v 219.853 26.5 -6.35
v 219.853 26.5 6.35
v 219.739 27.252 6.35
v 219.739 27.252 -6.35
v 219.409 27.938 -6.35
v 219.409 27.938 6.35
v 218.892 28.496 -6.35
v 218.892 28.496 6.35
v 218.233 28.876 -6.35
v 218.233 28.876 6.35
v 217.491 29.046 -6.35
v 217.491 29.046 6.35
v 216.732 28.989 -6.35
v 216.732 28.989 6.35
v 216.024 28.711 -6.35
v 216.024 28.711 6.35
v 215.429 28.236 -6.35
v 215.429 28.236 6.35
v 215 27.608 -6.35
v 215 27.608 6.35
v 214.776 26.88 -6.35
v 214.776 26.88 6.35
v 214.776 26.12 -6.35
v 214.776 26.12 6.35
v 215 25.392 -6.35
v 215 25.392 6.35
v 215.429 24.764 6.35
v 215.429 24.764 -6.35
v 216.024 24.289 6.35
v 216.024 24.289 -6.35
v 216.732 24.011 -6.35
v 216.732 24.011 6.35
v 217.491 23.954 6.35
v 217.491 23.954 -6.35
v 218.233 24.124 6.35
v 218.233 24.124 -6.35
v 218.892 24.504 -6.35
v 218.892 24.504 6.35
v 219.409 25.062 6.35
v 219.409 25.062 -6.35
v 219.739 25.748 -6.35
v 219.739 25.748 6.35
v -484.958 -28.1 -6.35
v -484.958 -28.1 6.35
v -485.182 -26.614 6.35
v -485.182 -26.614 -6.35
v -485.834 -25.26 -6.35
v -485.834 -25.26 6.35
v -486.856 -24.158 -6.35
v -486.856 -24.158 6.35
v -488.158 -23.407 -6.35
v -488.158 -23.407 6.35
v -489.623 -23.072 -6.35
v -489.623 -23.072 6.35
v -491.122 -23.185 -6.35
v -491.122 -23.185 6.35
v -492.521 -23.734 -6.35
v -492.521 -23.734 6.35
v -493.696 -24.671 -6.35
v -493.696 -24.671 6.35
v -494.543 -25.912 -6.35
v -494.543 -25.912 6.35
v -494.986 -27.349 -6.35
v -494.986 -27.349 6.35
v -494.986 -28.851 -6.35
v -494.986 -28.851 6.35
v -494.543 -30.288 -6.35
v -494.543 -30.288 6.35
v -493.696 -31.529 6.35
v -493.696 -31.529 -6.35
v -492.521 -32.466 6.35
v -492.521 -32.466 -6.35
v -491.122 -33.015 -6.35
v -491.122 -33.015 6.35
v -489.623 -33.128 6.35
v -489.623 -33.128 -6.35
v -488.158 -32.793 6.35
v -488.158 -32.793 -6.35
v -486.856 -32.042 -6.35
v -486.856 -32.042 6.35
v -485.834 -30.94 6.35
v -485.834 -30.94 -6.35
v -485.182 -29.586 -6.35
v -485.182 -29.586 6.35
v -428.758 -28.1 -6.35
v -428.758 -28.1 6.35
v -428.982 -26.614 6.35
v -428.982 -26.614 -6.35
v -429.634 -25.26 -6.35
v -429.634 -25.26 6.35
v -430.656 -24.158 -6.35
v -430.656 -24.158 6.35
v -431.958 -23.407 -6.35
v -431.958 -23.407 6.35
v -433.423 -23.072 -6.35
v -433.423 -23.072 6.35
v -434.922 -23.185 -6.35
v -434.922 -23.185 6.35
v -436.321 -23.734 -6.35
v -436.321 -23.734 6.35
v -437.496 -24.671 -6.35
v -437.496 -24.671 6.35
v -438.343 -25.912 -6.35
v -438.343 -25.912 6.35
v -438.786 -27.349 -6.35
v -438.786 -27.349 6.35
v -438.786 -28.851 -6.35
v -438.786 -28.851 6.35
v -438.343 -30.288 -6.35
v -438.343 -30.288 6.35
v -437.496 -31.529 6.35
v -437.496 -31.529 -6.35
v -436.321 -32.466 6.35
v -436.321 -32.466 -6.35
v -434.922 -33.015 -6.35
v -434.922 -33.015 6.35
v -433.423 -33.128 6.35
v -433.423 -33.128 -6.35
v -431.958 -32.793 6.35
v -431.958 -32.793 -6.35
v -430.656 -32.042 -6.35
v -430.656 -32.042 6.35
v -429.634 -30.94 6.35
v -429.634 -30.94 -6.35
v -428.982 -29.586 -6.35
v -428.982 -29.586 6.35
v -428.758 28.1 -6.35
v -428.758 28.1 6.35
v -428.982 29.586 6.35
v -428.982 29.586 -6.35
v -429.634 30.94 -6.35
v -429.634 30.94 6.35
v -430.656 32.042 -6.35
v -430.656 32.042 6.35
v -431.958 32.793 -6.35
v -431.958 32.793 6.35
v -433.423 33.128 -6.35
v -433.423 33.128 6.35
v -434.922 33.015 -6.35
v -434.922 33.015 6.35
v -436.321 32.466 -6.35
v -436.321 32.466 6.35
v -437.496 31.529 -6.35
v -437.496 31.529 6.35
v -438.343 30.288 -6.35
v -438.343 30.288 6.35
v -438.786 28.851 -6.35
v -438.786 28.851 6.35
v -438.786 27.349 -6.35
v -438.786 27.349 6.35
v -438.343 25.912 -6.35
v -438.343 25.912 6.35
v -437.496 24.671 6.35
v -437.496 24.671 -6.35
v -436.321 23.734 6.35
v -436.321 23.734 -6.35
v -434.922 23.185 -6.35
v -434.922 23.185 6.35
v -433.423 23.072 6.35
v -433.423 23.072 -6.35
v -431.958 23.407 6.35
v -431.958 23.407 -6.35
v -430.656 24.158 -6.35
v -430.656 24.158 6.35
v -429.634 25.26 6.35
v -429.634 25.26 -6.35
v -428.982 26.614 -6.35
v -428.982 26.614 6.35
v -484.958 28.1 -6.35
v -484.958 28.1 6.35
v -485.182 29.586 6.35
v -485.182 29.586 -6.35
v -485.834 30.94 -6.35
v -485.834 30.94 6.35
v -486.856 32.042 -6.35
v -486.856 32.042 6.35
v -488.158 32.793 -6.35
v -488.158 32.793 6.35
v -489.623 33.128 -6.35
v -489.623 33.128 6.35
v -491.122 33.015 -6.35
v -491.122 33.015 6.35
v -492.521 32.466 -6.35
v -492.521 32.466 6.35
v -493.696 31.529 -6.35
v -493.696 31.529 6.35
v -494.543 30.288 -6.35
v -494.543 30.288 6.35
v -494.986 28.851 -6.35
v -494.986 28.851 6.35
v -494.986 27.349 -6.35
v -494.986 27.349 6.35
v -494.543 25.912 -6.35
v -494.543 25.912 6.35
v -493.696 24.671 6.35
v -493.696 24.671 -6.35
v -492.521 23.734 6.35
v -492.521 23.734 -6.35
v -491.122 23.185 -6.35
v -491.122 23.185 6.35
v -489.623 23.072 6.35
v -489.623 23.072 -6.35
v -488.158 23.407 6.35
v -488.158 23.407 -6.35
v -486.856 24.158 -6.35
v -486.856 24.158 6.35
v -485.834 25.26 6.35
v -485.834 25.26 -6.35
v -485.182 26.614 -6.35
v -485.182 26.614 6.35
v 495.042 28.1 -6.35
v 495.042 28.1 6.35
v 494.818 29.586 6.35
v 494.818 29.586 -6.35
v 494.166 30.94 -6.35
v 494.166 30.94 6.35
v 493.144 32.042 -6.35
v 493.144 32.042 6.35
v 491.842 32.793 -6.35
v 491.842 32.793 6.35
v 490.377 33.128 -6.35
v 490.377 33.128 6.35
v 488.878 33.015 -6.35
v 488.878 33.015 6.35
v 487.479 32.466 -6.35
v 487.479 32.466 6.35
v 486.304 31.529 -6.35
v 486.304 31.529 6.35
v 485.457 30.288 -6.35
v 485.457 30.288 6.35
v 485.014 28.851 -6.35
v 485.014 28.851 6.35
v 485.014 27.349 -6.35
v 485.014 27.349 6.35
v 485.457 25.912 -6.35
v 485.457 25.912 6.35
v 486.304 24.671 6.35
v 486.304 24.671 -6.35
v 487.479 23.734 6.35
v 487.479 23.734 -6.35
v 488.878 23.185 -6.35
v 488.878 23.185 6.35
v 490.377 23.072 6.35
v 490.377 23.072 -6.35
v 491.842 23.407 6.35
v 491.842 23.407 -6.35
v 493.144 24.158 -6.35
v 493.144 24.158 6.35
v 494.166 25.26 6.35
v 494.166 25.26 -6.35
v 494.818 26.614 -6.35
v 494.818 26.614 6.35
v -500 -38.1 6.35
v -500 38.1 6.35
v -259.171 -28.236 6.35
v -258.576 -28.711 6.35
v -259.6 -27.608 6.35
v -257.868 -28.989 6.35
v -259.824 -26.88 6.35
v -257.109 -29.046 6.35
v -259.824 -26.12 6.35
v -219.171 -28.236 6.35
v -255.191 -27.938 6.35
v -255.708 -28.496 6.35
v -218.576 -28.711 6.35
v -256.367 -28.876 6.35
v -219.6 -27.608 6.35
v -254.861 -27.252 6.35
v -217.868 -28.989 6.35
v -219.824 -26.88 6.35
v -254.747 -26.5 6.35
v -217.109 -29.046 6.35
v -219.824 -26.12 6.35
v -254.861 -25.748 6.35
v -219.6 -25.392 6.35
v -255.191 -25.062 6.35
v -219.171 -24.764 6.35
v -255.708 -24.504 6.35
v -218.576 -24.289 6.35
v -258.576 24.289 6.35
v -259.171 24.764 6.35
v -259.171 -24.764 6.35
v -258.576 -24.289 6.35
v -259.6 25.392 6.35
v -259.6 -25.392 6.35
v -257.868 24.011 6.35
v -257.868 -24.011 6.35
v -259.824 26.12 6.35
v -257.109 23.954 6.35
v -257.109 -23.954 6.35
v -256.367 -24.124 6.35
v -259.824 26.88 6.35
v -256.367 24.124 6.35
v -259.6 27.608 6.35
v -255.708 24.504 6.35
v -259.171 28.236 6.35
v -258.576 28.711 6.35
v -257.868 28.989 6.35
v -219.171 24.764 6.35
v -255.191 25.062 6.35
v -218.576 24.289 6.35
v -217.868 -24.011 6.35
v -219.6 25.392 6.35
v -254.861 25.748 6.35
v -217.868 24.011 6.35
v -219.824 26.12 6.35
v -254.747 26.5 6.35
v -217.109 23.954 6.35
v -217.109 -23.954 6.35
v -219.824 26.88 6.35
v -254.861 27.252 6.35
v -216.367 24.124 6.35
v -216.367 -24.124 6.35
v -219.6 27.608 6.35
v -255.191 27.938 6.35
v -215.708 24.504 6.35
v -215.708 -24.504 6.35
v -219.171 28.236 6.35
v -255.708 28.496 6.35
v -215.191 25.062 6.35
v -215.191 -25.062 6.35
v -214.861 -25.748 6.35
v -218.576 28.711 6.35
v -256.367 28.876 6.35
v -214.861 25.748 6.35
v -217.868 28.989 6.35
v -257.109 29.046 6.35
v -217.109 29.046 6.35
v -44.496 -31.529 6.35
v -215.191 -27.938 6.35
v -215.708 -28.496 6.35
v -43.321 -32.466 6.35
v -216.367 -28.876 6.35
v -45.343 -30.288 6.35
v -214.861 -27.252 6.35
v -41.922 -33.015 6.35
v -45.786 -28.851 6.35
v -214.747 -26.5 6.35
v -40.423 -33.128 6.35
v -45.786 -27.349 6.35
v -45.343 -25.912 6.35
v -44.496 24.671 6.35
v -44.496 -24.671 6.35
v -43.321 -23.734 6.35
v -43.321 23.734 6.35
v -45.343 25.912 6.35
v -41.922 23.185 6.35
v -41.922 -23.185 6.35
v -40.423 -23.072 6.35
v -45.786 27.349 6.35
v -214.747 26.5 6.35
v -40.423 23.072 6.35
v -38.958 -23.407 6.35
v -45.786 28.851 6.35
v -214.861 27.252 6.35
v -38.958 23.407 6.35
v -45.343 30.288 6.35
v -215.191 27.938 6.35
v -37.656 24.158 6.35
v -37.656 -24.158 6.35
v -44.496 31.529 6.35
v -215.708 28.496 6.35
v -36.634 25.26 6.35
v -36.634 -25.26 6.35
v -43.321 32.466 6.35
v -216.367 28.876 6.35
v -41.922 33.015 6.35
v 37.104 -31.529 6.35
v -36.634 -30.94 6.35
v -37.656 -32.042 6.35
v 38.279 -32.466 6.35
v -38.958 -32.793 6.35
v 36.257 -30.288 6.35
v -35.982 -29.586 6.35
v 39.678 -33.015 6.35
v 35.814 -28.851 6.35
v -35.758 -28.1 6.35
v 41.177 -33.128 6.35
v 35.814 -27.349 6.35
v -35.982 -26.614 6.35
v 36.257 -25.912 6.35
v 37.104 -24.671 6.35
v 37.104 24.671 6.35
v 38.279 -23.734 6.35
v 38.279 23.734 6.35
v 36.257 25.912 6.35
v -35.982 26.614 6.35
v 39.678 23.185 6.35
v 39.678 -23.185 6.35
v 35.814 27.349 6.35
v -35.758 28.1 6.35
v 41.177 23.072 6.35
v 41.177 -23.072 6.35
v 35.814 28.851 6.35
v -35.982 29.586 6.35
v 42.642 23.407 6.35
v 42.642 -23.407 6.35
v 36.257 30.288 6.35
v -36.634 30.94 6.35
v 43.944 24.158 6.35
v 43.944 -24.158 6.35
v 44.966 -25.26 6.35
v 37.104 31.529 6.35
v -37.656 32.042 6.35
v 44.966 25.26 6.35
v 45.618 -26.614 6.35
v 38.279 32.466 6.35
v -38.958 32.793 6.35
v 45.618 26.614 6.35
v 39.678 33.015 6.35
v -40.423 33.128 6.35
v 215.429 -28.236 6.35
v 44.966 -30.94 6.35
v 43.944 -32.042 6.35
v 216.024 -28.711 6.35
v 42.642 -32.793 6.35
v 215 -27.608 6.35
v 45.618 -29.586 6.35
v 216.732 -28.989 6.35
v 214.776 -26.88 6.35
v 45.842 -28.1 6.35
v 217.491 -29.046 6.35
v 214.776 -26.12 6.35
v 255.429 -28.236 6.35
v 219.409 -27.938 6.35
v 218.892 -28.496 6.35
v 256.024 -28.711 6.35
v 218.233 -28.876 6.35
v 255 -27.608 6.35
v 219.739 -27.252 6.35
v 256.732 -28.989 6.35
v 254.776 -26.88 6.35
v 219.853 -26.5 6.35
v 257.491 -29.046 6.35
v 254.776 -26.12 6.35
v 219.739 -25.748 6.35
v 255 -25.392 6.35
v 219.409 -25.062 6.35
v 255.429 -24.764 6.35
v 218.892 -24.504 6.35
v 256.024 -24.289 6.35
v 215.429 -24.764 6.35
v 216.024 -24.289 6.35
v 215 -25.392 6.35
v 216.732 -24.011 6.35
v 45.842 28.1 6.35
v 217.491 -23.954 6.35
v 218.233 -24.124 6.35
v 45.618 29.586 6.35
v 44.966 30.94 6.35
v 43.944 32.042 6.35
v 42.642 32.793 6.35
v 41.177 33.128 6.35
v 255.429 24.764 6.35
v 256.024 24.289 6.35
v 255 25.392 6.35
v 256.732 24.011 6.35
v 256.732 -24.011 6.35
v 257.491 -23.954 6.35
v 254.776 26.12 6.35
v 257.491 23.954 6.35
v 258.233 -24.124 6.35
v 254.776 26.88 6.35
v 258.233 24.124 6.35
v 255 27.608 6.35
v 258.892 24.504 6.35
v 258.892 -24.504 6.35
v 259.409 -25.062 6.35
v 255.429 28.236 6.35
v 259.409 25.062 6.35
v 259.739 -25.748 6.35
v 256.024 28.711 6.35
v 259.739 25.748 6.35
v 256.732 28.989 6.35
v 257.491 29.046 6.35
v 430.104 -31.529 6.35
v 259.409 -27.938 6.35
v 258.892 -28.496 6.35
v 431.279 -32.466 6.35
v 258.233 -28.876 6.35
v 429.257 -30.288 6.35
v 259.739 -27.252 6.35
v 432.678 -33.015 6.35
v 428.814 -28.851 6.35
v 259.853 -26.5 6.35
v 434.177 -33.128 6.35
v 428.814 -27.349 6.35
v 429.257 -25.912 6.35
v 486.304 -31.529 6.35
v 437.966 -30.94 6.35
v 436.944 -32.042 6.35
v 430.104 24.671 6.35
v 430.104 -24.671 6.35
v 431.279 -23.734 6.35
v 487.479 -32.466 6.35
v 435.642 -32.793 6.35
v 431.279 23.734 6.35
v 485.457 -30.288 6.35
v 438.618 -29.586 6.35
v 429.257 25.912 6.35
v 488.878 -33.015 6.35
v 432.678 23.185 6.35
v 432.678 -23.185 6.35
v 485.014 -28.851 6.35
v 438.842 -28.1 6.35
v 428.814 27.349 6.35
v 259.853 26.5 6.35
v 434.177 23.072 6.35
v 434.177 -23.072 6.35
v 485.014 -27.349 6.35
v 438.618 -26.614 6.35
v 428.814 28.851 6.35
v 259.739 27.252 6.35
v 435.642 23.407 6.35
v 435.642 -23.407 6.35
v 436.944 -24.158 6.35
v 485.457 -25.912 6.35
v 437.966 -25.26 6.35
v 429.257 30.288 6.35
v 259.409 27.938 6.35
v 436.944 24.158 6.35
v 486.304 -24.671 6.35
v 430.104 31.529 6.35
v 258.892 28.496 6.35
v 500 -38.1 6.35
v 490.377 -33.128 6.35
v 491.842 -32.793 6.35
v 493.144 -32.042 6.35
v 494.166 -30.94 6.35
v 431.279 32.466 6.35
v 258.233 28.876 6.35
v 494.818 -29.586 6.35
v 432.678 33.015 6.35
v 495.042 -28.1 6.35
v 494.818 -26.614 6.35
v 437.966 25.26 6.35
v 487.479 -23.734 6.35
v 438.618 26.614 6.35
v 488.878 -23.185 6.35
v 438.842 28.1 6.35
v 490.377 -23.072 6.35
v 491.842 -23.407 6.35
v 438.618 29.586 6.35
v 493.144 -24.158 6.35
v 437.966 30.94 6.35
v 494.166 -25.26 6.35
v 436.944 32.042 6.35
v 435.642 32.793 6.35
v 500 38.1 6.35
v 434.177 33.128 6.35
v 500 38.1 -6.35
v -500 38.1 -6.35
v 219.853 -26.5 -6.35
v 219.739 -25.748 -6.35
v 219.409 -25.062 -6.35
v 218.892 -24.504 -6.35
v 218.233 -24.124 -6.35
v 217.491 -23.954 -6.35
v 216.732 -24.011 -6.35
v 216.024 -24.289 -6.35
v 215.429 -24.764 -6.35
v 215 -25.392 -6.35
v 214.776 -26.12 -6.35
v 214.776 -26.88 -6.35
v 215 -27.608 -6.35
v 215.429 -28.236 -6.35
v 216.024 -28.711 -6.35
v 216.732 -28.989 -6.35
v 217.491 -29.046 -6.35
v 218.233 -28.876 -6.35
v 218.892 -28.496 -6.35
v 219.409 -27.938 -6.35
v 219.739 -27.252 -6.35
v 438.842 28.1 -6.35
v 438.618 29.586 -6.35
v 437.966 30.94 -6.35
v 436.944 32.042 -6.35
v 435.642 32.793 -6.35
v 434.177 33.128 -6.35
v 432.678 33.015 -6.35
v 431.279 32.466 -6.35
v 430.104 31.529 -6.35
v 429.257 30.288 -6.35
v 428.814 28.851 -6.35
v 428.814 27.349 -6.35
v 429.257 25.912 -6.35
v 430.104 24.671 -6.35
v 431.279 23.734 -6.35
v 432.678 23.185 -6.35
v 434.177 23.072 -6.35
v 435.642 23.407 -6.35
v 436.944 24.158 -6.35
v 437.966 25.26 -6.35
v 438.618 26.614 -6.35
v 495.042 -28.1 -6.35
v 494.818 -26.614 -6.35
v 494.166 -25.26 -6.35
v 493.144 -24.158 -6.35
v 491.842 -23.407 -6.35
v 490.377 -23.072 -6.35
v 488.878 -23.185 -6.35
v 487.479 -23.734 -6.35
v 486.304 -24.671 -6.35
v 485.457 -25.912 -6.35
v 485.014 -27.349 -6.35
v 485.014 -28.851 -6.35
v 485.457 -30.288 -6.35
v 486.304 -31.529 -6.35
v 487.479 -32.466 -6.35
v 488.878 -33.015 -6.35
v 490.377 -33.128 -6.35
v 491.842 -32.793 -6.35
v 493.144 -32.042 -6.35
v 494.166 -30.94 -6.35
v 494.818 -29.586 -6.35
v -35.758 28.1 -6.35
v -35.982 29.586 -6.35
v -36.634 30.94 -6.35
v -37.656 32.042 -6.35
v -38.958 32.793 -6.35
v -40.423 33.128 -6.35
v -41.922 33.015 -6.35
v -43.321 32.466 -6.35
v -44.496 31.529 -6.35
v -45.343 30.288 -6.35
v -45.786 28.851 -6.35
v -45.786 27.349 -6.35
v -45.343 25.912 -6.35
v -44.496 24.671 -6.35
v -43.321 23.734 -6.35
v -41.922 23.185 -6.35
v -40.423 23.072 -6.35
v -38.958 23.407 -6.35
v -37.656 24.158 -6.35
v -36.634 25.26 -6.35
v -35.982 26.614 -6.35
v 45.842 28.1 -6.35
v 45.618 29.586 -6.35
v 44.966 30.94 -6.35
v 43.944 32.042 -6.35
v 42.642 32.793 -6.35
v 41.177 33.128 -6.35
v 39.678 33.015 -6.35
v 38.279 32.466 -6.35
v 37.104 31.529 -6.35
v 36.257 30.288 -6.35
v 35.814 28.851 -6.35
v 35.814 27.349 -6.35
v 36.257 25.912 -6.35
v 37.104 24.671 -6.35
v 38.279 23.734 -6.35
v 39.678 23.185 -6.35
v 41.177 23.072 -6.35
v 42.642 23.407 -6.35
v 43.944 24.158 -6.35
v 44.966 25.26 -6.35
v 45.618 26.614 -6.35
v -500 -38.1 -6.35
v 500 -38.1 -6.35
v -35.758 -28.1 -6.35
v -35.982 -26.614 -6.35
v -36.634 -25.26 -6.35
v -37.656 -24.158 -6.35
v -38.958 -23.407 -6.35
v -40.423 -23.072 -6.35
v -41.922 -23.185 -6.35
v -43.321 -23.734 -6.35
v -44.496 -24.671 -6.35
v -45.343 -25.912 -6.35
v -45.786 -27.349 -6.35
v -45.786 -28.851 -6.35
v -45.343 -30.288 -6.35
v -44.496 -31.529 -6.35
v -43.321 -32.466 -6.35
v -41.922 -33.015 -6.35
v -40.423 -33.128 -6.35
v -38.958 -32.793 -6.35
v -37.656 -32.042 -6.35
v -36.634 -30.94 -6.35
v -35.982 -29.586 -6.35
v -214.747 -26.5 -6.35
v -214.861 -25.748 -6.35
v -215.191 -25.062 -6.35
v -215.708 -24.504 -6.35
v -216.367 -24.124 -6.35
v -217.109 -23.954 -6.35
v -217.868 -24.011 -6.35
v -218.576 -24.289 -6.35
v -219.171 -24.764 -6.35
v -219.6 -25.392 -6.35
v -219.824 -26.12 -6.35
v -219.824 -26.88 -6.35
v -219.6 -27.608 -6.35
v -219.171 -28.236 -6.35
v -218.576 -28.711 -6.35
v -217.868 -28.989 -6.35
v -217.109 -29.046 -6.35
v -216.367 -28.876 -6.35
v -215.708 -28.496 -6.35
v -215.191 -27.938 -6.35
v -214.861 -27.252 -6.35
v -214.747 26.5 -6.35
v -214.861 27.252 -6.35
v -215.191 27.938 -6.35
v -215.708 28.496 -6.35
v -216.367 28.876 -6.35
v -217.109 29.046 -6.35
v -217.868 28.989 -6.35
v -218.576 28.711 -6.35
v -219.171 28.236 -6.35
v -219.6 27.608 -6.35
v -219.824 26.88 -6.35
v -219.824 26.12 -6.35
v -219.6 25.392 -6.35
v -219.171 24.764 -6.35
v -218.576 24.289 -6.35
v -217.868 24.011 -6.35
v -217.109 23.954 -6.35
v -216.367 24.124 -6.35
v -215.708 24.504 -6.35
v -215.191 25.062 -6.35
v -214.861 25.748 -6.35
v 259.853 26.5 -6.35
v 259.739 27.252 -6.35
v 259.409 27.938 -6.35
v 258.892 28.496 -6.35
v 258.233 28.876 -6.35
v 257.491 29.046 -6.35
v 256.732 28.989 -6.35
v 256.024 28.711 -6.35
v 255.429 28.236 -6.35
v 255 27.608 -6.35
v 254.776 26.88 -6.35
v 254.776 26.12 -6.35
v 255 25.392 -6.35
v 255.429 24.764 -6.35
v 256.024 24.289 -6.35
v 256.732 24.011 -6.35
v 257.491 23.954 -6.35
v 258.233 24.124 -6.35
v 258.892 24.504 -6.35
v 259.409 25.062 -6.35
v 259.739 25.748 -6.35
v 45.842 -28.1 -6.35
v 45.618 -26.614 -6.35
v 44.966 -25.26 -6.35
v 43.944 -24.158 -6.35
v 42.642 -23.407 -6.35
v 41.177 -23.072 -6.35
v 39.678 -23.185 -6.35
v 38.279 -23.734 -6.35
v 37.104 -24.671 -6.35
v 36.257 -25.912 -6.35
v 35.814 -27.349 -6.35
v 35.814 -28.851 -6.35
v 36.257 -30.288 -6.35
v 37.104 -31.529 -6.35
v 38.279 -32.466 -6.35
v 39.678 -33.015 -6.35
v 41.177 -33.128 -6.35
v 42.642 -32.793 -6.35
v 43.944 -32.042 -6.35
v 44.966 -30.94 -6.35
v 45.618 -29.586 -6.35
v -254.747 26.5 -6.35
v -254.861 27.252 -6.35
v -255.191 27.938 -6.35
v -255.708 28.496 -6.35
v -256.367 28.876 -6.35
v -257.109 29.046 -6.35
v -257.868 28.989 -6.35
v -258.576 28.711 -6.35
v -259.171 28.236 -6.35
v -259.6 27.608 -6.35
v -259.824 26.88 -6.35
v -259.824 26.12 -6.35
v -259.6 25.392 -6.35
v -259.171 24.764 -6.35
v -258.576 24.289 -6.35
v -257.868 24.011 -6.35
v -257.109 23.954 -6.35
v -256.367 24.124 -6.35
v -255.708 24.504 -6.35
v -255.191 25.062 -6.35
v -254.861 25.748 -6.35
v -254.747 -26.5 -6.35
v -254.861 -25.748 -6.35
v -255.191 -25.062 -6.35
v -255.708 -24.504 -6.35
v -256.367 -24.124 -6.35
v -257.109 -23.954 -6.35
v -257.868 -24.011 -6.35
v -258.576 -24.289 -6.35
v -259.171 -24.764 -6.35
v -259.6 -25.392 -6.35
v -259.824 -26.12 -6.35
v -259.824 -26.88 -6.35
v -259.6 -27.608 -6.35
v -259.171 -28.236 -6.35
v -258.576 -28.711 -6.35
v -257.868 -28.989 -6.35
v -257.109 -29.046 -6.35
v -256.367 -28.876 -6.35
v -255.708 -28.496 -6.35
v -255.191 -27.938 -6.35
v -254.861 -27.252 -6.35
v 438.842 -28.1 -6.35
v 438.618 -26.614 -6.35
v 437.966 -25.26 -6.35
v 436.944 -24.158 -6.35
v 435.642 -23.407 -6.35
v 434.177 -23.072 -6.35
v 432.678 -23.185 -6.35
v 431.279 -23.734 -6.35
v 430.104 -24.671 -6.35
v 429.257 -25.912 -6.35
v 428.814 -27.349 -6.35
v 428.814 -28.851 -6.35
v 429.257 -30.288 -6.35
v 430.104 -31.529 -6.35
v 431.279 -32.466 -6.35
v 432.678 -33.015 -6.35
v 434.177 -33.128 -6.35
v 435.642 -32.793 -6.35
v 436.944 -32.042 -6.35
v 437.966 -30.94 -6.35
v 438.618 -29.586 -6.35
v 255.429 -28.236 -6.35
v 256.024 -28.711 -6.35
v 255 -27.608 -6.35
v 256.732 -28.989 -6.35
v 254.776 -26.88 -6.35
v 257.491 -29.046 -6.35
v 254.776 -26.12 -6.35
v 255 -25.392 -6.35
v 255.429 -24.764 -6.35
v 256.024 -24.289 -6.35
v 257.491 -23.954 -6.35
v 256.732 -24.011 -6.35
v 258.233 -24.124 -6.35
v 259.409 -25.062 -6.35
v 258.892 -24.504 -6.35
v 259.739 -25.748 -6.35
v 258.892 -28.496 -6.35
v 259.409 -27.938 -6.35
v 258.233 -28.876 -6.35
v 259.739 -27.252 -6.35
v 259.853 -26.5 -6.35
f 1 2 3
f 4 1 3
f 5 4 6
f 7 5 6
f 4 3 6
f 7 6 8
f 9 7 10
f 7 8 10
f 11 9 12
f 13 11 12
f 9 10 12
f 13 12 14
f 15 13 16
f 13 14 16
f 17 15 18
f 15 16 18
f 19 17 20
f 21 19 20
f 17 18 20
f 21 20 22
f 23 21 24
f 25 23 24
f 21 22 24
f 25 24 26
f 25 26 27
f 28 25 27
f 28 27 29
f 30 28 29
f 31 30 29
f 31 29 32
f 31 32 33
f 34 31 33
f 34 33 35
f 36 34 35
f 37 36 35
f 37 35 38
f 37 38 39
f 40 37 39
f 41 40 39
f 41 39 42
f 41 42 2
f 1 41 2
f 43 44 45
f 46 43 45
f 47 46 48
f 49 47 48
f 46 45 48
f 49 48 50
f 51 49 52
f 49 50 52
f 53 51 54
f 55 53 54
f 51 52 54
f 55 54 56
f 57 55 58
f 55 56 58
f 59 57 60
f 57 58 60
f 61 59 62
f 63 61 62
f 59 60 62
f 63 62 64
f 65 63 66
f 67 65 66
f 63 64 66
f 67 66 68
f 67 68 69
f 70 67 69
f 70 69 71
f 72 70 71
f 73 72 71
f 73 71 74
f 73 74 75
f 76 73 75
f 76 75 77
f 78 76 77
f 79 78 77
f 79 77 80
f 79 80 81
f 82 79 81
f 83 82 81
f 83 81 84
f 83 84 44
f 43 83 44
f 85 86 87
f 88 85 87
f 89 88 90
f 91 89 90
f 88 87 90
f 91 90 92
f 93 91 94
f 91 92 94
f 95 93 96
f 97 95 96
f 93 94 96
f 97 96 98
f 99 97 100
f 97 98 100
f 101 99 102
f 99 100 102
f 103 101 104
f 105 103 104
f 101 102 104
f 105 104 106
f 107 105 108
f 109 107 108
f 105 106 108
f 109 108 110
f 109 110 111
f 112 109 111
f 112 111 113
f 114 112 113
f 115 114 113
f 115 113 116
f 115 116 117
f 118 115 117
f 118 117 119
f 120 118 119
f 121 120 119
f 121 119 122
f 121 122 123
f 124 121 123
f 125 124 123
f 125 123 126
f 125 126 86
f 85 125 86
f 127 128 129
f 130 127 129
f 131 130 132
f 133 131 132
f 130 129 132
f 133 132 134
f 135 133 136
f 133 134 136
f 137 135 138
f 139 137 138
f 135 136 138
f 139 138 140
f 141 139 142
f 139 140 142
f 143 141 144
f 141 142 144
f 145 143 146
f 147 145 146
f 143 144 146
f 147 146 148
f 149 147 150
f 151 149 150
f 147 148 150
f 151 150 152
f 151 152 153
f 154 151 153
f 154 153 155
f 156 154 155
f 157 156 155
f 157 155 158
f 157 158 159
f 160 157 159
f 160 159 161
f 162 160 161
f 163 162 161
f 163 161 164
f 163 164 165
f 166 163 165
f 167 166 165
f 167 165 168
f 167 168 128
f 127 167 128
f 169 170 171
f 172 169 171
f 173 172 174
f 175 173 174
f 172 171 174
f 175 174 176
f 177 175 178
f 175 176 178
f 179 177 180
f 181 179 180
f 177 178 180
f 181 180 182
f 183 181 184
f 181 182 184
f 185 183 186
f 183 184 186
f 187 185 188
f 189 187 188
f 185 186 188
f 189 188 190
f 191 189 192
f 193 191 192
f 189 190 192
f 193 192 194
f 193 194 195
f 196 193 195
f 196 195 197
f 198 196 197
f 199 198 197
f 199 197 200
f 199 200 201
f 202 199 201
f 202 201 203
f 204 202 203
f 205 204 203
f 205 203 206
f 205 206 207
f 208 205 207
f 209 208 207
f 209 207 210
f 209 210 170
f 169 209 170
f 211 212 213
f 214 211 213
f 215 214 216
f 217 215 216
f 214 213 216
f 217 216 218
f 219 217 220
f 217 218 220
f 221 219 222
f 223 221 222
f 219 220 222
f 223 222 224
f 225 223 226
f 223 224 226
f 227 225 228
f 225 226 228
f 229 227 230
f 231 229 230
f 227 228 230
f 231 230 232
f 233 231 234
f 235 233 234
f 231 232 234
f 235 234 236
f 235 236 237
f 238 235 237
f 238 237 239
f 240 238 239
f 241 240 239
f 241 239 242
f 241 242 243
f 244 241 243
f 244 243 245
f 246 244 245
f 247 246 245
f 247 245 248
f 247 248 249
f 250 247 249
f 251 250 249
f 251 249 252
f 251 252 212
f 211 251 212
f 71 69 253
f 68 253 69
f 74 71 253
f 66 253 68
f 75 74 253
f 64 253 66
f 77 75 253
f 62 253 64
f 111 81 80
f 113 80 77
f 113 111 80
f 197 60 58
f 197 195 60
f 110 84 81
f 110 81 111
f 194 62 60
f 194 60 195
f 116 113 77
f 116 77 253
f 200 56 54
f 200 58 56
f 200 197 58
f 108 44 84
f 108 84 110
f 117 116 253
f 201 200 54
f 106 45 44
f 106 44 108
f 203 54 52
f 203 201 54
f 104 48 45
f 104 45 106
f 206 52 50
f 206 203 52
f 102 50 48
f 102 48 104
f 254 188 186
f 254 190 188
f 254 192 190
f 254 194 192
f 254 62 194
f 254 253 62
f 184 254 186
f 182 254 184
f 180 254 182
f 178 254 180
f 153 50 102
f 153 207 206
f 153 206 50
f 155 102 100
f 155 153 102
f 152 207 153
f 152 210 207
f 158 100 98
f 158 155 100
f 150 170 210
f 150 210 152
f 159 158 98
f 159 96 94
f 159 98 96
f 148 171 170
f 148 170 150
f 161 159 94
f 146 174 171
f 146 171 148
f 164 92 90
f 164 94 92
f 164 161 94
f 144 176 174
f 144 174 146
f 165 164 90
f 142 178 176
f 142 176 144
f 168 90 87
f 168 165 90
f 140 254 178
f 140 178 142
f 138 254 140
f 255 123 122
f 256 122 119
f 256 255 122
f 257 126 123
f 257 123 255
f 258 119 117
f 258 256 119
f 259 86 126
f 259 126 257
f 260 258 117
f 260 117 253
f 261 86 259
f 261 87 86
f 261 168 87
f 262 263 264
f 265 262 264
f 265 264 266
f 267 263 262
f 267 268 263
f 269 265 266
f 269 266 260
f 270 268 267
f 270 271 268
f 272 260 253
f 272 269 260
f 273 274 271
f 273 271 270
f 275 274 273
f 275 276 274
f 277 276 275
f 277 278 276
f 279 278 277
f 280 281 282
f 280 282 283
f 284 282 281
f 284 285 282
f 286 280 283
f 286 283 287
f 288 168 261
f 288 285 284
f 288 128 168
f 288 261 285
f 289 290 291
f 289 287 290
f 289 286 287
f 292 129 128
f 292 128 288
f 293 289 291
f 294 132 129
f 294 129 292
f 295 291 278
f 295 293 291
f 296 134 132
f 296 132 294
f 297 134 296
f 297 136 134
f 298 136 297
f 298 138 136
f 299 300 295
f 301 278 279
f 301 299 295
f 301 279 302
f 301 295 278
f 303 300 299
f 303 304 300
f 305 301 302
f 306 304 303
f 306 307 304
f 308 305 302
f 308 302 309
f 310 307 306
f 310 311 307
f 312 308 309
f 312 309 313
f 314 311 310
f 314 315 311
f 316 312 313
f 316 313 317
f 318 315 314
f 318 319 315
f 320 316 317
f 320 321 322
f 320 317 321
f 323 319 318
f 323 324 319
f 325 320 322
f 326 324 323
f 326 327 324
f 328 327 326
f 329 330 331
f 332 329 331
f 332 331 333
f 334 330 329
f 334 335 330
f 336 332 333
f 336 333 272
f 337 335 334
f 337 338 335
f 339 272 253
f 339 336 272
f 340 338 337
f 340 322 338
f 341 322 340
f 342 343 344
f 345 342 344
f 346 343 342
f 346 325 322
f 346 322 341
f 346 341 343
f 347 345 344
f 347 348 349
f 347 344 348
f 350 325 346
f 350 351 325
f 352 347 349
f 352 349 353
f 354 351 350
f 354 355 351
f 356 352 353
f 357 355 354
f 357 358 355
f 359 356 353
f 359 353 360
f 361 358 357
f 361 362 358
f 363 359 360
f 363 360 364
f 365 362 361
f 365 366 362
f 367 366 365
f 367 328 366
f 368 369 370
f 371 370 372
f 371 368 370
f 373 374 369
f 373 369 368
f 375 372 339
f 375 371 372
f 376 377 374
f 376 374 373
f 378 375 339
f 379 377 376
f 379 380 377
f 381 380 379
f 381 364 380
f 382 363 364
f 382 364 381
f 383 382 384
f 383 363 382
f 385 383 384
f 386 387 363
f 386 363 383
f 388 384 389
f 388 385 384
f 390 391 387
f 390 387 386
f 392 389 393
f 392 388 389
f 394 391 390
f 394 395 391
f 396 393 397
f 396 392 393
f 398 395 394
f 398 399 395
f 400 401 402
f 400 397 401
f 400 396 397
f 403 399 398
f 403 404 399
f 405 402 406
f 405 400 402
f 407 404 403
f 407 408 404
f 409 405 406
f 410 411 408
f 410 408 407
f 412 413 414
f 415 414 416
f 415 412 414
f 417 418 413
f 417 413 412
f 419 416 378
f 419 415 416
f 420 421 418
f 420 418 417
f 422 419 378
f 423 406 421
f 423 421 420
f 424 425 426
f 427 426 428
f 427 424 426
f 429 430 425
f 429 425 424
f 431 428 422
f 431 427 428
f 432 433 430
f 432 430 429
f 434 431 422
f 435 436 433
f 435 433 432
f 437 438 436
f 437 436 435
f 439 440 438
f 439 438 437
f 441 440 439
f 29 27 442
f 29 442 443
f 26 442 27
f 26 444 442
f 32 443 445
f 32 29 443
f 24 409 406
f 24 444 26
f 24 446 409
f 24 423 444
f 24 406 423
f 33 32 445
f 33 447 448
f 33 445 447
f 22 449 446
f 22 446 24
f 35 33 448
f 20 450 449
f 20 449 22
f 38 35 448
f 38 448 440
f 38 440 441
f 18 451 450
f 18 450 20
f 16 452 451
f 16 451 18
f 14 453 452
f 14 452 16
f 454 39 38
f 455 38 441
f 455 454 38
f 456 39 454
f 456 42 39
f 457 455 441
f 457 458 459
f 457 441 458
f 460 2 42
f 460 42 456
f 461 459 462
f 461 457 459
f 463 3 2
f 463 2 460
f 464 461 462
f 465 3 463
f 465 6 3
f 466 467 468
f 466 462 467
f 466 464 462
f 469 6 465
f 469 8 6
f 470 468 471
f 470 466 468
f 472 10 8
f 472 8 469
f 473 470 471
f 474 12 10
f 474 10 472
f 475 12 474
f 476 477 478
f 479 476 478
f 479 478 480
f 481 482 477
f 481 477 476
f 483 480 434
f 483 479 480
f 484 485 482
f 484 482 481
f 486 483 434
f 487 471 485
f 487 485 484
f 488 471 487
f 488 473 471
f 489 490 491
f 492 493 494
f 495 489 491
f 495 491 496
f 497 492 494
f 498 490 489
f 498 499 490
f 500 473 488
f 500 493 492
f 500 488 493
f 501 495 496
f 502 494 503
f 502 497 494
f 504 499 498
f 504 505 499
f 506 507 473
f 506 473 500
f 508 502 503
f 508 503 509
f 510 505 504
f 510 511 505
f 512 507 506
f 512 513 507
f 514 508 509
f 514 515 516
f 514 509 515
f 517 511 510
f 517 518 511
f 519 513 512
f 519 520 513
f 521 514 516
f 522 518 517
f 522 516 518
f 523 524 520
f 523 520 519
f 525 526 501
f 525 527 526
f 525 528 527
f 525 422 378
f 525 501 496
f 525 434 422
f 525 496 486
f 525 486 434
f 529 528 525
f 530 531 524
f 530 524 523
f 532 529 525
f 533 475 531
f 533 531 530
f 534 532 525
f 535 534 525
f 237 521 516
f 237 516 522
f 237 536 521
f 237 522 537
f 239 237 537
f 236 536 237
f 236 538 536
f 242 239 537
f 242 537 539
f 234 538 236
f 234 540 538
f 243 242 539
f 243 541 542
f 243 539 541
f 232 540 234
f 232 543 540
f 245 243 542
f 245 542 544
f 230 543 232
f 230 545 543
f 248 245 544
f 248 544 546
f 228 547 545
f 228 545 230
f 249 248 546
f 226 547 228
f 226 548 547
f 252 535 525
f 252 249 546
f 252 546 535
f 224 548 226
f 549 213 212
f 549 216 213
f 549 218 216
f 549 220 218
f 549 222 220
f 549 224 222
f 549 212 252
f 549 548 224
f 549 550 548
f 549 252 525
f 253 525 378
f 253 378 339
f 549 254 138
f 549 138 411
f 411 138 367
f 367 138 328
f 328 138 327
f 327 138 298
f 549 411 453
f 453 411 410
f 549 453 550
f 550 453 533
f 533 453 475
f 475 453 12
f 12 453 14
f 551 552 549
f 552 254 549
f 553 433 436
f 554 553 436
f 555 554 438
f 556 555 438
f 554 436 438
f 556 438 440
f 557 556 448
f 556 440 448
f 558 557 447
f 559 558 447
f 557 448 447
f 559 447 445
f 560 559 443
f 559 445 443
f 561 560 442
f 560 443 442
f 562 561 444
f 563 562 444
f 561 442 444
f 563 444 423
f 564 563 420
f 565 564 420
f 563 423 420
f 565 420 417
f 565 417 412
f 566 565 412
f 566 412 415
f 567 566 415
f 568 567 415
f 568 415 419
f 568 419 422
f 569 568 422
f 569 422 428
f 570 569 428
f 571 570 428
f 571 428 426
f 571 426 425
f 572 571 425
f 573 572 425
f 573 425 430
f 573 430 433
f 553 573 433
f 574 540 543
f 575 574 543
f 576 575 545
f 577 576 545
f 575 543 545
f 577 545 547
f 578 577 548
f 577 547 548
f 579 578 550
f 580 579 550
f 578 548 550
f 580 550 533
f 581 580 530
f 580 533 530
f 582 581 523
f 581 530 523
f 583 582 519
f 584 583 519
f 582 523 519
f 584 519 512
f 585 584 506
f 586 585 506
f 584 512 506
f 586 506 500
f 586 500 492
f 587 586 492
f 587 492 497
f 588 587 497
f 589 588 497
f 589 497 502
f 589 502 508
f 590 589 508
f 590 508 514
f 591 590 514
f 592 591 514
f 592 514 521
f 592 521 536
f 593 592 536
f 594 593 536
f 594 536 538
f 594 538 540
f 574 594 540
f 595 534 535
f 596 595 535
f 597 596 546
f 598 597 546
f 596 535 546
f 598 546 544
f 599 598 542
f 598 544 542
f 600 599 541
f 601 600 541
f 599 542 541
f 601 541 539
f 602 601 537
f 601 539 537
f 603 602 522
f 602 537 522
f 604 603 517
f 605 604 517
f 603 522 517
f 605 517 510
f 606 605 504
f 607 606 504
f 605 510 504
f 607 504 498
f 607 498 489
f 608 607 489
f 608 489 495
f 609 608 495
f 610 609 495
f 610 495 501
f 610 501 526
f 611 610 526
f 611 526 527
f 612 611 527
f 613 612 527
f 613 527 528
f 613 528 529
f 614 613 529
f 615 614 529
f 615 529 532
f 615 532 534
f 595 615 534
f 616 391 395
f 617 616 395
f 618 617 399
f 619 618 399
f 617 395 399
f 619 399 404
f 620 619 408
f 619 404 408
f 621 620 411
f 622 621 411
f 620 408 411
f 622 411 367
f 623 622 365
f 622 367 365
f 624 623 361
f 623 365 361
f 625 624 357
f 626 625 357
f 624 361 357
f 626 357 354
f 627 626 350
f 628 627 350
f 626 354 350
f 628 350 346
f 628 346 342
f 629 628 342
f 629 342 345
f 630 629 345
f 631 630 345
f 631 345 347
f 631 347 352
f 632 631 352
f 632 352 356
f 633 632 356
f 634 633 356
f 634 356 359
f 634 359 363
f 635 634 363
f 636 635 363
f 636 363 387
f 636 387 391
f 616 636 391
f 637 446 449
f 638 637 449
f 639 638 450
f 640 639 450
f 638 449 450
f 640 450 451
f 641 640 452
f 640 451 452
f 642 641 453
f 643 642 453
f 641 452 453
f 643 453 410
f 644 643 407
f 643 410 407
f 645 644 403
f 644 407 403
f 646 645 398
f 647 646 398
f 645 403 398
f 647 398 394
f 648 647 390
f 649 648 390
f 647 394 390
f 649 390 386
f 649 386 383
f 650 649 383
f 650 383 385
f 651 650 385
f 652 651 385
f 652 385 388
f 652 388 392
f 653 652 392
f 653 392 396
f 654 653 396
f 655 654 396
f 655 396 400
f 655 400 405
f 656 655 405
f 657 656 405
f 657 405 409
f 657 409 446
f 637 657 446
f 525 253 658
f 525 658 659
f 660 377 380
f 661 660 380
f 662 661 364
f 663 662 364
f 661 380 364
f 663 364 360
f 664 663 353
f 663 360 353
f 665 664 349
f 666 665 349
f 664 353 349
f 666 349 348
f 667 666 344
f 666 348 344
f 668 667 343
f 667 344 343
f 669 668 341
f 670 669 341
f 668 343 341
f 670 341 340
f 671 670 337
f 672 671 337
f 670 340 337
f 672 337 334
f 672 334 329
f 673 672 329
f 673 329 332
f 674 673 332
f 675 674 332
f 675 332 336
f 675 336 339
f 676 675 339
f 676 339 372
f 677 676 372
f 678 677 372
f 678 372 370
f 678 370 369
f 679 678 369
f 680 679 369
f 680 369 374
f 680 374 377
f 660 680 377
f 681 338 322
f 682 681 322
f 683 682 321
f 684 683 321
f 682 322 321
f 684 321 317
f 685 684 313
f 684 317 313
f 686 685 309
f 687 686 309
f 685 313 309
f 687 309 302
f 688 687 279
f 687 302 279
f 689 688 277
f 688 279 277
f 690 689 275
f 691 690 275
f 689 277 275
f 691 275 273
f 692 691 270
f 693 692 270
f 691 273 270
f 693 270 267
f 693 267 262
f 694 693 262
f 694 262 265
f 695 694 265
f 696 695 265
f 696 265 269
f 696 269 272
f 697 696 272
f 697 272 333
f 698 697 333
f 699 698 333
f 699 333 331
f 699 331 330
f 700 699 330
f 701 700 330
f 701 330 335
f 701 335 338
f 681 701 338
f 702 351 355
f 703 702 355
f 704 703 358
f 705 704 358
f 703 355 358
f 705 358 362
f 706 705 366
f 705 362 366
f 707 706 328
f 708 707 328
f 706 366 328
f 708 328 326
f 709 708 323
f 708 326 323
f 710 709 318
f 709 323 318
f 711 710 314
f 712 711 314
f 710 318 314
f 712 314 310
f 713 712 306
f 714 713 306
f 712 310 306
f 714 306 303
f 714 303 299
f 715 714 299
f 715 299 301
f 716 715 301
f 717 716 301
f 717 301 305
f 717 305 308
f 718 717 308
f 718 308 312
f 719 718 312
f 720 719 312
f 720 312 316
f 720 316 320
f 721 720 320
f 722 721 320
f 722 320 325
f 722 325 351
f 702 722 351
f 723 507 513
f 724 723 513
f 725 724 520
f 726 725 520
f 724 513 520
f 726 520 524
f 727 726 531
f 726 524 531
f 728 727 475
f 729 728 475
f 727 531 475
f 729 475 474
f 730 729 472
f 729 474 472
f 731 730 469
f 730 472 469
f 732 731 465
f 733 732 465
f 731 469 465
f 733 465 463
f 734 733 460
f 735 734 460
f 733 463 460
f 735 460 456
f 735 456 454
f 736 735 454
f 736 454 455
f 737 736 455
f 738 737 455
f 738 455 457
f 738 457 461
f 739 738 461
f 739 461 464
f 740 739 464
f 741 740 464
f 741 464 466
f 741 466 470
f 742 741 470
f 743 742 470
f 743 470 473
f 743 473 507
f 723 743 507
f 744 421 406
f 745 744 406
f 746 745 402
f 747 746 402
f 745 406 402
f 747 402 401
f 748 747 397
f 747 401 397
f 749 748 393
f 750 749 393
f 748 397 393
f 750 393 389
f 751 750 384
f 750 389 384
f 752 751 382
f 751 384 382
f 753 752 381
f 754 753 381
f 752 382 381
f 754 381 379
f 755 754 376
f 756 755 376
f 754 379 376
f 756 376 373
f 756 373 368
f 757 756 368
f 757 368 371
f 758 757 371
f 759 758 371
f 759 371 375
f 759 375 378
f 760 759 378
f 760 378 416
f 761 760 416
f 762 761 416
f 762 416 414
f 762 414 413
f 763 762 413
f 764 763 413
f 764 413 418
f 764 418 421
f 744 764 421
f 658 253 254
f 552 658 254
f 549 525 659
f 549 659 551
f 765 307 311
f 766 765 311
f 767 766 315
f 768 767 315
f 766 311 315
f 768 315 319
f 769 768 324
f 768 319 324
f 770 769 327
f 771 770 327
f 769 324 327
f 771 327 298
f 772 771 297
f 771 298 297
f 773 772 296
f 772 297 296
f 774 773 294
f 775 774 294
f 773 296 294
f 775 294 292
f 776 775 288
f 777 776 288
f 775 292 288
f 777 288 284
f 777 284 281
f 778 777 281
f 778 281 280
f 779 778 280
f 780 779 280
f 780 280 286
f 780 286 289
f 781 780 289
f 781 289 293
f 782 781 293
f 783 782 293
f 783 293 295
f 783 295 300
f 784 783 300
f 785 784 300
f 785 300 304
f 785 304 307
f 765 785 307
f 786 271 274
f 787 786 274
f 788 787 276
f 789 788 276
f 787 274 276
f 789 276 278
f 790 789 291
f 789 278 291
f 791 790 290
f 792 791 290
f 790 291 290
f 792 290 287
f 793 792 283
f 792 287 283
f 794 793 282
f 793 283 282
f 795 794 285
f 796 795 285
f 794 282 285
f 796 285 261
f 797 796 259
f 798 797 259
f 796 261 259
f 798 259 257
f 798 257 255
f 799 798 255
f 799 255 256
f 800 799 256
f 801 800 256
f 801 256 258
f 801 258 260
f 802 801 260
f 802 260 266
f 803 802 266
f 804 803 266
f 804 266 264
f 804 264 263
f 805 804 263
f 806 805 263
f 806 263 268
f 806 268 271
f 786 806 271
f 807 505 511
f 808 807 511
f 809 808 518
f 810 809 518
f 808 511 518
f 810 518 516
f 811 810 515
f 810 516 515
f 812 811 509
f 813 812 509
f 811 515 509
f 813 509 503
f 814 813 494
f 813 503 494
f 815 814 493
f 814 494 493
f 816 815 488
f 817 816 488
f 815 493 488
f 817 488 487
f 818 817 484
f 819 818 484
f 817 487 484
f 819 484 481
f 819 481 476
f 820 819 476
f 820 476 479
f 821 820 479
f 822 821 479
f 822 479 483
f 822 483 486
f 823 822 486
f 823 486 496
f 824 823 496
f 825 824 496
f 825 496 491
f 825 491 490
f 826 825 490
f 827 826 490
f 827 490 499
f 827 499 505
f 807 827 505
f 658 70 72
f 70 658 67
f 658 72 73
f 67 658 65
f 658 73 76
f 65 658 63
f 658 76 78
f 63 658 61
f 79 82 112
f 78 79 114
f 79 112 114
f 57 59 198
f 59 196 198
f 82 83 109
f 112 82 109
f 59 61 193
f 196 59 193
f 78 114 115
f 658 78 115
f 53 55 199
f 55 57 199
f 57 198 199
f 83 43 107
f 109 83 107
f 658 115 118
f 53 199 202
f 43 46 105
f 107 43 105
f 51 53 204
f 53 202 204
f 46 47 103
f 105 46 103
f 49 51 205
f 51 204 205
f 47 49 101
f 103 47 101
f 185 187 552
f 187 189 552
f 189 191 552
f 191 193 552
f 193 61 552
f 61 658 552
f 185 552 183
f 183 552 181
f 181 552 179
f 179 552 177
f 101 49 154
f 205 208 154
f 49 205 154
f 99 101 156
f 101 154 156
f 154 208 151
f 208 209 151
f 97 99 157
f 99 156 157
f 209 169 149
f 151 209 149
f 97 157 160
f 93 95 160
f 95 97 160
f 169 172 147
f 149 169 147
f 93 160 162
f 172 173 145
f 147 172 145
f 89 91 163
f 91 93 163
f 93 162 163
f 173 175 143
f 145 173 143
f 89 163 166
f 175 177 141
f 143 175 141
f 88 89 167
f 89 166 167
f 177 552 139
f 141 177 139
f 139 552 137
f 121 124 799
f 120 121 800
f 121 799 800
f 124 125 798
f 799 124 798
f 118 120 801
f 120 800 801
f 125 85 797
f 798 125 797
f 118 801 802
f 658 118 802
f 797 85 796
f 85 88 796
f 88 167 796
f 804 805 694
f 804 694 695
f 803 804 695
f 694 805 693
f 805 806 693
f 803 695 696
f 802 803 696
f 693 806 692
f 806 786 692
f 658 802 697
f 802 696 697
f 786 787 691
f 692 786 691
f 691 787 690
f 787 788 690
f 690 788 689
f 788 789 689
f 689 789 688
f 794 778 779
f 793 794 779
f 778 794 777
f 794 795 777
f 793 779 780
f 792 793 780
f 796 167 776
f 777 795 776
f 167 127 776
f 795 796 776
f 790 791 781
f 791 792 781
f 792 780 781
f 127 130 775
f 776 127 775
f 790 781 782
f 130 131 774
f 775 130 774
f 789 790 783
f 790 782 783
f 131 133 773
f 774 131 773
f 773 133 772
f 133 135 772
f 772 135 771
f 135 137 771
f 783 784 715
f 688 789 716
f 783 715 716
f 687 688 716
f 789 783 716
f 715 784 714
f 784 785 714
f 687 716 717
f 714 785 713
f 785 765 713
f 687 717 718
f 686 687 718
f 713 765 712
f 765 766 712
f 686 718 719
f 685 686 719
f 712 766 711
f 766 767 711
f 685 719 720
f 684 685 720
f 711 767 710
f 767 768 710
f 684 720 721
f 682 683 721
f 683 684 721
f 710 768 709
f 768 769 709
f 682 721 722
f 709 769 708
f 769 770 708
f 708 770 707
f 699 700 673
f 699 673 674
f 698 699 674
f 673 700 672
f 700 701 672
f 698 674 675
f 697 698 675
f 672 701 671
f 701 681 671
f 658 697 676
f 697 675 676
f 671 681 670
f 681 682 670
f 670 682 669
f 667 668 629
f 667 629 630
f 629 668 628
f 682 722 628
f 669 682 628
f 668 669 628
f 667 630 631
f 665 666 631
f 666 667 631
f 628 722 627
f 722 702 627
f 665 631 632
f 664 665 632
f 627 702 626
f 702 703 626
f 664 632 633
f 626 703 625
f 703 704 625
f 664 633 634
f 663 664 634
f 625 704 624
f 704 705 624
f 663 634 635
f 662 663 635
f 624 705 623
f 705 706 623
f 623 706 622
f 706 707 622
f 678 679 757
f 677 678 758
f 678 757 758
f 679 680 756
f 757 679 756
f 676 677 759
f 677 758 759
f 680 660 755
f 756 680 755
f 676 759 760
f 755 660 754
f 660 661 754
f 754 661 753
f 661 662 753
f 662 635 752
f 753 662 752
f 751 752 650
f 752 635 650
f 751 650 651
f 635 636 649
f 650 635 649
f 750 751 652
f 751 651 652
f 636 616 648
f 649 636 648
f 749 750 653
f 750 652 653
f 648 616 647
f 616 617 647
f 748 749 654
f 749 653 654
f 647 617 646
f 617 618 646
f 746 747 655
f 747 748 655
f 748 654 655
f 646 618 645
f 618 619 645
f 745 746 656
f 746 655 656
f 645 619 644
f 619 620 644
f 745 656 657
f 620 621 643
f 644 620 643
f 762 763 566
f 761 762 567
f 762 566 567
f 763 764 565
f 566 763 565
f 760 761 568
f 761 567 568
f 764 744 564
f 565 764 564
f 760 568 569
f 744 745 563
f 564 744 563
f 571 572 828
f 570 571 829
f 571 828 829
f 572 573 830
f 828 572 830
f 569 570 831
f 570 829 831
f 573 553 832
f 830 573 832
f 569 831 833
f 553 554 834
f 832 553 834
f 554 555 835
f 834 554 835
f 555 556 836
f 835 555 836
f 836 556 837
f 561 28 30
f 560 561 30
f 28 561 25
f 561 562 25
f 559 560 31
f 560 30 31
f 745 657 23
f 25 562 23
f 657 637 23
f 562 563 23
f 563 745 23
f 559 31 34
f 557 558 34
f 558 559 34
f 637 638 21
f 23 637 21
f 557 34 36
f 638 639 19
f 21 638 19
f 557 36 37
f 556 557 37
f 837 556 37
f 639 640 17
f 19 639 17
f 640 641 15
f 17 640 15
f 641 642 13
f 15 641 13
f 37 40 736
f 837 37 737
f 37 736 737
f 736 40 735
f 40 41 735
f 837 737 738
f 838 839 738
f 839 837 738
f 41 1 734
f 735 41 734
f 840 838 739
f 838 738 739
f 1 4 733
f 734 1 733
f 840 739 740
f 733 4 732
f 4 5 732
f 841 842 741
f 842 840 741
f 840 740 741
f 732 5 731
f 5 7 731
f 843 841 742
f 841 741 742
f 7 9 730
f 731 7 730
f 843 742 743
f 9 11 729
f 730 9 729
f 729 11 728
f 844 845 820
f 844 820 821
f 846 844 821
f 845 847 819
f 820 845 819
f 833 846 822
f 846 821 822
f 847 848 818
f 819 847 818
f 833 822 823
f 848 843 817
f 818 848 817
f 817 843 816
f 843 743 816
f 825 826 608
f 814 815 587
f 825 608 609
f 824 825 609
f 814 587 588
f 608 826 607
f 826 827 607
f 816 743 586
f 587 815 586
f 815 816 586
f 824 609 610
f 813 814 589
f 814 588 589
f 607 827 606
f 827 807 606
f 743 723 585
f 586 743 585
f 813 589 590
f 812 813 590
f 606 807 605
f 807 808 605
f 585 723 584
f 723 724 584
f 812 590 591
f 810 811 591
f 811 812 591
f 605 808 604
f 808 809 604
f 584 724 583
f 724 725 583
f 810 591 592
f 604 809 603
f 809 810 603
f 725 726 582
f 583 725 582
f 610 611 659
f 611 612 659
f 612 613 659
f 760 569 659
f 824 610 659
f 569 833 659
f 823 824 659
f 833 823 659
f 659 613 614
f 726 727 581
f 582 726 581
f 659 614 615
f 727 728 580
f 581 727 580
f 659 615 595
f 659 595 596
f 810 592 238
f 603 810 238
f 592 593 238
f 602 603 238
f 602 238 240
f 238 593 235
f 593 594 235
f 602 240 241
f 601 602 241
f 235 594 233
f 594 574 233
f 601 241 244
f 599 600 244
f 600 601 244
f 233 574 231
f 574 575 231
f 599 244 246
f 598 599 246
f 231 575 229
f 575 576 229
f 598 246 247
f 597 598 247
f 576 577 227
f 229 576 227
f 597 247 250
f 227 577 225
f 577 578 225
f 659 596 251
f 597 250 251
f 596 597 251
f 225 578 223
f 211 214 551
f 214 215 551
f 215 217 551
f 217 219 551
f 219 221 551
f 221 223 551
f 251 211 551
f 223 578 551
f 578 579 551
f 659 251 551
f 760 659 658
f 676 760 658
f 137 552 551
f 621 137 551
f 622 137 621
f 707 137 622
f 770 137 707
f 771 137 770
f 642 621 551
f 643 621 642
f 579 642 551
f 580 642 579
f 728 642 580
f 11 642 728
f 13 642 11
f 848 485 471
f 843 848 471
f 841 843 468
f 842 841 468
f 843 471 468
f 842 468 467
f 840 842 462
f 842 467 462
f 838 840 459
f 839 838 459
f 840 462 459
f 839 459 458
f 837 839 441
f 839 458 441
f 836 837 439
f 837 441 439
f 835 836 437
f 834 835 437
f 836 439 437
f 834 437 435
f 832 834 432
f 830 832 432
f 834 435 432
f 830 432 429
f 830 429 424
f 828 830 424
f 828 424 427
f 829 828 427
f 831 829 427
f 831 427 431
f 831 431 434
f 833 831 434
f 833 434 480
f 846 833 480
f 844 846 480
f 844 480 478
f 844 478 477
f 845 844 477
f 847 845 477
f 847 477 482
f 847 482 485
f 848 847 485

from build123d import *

# Parameters (mm, degrees)
CROQUIS1_W                    = 1000
CROQUIS1_H                    = 76.2
SALIENTE_EXTRUIR1_DEPTH       = 6.35
TALADRO_DE_MARGEN_PARA_3_81_D = 10.0838
F_10_CLEARANCE_HOLE1_D        = 5.1054


with BuildPart() as part:
    # Croquis1 → Saliente-Extruir1 (new, symmetric)
    with BuildSketch(Plane.XY):
        Rectangle(CROQUIS1_W, CROQUIS1_H)
    extrude(amount=SALIENTE_EXTRUIR1_DEPTH, both=True)

    # Taladro de margen para 3/81 (through all)
    with Locations(Plane(origin=(0, 0, -6.35), x_dir=(-1, 0, 0), z_dir=(0, 0, -1))):
        with Locations((433.800006232, 28.100007642), (490.000006232, 28.100007642), (490.000006232, -28.100007642), (433.800006232, -28.100007642), (-433.800006232, -28.100007642), (-490.000006232, -28.100007642), (-490.000006232, 28.100007642), (-433.800006232, 28.100007642), (40.799999964, 28.099999988), (40.799999964, -28.099999988), (-40.799999964, 28.099999988), (-40.799999964, -28.099999988)):
            Hole(TALADRO_DE_MARGEN_PARA_3_81_D / 2)

    # #10 Clearance Hole1 (through all)
    with Locations(Plane(origin=(0, 0, -6.35), x_dir=(-1, 0, 0), z_dir=(0, 0, -1))):
        with Locations((217.300003098, 26.5), (257.300003098, 26.5), (257.300003098, -26.5), (217.300003098, -26.5), (-257.300003098, 26.5), (-257.300003098, -26.5), (-217.300003098, -26.5), (-217.300003098, 26.5)):
            Hole(F_10_CLEARANCE_HOLE1_D / 2)


solid = part.part
